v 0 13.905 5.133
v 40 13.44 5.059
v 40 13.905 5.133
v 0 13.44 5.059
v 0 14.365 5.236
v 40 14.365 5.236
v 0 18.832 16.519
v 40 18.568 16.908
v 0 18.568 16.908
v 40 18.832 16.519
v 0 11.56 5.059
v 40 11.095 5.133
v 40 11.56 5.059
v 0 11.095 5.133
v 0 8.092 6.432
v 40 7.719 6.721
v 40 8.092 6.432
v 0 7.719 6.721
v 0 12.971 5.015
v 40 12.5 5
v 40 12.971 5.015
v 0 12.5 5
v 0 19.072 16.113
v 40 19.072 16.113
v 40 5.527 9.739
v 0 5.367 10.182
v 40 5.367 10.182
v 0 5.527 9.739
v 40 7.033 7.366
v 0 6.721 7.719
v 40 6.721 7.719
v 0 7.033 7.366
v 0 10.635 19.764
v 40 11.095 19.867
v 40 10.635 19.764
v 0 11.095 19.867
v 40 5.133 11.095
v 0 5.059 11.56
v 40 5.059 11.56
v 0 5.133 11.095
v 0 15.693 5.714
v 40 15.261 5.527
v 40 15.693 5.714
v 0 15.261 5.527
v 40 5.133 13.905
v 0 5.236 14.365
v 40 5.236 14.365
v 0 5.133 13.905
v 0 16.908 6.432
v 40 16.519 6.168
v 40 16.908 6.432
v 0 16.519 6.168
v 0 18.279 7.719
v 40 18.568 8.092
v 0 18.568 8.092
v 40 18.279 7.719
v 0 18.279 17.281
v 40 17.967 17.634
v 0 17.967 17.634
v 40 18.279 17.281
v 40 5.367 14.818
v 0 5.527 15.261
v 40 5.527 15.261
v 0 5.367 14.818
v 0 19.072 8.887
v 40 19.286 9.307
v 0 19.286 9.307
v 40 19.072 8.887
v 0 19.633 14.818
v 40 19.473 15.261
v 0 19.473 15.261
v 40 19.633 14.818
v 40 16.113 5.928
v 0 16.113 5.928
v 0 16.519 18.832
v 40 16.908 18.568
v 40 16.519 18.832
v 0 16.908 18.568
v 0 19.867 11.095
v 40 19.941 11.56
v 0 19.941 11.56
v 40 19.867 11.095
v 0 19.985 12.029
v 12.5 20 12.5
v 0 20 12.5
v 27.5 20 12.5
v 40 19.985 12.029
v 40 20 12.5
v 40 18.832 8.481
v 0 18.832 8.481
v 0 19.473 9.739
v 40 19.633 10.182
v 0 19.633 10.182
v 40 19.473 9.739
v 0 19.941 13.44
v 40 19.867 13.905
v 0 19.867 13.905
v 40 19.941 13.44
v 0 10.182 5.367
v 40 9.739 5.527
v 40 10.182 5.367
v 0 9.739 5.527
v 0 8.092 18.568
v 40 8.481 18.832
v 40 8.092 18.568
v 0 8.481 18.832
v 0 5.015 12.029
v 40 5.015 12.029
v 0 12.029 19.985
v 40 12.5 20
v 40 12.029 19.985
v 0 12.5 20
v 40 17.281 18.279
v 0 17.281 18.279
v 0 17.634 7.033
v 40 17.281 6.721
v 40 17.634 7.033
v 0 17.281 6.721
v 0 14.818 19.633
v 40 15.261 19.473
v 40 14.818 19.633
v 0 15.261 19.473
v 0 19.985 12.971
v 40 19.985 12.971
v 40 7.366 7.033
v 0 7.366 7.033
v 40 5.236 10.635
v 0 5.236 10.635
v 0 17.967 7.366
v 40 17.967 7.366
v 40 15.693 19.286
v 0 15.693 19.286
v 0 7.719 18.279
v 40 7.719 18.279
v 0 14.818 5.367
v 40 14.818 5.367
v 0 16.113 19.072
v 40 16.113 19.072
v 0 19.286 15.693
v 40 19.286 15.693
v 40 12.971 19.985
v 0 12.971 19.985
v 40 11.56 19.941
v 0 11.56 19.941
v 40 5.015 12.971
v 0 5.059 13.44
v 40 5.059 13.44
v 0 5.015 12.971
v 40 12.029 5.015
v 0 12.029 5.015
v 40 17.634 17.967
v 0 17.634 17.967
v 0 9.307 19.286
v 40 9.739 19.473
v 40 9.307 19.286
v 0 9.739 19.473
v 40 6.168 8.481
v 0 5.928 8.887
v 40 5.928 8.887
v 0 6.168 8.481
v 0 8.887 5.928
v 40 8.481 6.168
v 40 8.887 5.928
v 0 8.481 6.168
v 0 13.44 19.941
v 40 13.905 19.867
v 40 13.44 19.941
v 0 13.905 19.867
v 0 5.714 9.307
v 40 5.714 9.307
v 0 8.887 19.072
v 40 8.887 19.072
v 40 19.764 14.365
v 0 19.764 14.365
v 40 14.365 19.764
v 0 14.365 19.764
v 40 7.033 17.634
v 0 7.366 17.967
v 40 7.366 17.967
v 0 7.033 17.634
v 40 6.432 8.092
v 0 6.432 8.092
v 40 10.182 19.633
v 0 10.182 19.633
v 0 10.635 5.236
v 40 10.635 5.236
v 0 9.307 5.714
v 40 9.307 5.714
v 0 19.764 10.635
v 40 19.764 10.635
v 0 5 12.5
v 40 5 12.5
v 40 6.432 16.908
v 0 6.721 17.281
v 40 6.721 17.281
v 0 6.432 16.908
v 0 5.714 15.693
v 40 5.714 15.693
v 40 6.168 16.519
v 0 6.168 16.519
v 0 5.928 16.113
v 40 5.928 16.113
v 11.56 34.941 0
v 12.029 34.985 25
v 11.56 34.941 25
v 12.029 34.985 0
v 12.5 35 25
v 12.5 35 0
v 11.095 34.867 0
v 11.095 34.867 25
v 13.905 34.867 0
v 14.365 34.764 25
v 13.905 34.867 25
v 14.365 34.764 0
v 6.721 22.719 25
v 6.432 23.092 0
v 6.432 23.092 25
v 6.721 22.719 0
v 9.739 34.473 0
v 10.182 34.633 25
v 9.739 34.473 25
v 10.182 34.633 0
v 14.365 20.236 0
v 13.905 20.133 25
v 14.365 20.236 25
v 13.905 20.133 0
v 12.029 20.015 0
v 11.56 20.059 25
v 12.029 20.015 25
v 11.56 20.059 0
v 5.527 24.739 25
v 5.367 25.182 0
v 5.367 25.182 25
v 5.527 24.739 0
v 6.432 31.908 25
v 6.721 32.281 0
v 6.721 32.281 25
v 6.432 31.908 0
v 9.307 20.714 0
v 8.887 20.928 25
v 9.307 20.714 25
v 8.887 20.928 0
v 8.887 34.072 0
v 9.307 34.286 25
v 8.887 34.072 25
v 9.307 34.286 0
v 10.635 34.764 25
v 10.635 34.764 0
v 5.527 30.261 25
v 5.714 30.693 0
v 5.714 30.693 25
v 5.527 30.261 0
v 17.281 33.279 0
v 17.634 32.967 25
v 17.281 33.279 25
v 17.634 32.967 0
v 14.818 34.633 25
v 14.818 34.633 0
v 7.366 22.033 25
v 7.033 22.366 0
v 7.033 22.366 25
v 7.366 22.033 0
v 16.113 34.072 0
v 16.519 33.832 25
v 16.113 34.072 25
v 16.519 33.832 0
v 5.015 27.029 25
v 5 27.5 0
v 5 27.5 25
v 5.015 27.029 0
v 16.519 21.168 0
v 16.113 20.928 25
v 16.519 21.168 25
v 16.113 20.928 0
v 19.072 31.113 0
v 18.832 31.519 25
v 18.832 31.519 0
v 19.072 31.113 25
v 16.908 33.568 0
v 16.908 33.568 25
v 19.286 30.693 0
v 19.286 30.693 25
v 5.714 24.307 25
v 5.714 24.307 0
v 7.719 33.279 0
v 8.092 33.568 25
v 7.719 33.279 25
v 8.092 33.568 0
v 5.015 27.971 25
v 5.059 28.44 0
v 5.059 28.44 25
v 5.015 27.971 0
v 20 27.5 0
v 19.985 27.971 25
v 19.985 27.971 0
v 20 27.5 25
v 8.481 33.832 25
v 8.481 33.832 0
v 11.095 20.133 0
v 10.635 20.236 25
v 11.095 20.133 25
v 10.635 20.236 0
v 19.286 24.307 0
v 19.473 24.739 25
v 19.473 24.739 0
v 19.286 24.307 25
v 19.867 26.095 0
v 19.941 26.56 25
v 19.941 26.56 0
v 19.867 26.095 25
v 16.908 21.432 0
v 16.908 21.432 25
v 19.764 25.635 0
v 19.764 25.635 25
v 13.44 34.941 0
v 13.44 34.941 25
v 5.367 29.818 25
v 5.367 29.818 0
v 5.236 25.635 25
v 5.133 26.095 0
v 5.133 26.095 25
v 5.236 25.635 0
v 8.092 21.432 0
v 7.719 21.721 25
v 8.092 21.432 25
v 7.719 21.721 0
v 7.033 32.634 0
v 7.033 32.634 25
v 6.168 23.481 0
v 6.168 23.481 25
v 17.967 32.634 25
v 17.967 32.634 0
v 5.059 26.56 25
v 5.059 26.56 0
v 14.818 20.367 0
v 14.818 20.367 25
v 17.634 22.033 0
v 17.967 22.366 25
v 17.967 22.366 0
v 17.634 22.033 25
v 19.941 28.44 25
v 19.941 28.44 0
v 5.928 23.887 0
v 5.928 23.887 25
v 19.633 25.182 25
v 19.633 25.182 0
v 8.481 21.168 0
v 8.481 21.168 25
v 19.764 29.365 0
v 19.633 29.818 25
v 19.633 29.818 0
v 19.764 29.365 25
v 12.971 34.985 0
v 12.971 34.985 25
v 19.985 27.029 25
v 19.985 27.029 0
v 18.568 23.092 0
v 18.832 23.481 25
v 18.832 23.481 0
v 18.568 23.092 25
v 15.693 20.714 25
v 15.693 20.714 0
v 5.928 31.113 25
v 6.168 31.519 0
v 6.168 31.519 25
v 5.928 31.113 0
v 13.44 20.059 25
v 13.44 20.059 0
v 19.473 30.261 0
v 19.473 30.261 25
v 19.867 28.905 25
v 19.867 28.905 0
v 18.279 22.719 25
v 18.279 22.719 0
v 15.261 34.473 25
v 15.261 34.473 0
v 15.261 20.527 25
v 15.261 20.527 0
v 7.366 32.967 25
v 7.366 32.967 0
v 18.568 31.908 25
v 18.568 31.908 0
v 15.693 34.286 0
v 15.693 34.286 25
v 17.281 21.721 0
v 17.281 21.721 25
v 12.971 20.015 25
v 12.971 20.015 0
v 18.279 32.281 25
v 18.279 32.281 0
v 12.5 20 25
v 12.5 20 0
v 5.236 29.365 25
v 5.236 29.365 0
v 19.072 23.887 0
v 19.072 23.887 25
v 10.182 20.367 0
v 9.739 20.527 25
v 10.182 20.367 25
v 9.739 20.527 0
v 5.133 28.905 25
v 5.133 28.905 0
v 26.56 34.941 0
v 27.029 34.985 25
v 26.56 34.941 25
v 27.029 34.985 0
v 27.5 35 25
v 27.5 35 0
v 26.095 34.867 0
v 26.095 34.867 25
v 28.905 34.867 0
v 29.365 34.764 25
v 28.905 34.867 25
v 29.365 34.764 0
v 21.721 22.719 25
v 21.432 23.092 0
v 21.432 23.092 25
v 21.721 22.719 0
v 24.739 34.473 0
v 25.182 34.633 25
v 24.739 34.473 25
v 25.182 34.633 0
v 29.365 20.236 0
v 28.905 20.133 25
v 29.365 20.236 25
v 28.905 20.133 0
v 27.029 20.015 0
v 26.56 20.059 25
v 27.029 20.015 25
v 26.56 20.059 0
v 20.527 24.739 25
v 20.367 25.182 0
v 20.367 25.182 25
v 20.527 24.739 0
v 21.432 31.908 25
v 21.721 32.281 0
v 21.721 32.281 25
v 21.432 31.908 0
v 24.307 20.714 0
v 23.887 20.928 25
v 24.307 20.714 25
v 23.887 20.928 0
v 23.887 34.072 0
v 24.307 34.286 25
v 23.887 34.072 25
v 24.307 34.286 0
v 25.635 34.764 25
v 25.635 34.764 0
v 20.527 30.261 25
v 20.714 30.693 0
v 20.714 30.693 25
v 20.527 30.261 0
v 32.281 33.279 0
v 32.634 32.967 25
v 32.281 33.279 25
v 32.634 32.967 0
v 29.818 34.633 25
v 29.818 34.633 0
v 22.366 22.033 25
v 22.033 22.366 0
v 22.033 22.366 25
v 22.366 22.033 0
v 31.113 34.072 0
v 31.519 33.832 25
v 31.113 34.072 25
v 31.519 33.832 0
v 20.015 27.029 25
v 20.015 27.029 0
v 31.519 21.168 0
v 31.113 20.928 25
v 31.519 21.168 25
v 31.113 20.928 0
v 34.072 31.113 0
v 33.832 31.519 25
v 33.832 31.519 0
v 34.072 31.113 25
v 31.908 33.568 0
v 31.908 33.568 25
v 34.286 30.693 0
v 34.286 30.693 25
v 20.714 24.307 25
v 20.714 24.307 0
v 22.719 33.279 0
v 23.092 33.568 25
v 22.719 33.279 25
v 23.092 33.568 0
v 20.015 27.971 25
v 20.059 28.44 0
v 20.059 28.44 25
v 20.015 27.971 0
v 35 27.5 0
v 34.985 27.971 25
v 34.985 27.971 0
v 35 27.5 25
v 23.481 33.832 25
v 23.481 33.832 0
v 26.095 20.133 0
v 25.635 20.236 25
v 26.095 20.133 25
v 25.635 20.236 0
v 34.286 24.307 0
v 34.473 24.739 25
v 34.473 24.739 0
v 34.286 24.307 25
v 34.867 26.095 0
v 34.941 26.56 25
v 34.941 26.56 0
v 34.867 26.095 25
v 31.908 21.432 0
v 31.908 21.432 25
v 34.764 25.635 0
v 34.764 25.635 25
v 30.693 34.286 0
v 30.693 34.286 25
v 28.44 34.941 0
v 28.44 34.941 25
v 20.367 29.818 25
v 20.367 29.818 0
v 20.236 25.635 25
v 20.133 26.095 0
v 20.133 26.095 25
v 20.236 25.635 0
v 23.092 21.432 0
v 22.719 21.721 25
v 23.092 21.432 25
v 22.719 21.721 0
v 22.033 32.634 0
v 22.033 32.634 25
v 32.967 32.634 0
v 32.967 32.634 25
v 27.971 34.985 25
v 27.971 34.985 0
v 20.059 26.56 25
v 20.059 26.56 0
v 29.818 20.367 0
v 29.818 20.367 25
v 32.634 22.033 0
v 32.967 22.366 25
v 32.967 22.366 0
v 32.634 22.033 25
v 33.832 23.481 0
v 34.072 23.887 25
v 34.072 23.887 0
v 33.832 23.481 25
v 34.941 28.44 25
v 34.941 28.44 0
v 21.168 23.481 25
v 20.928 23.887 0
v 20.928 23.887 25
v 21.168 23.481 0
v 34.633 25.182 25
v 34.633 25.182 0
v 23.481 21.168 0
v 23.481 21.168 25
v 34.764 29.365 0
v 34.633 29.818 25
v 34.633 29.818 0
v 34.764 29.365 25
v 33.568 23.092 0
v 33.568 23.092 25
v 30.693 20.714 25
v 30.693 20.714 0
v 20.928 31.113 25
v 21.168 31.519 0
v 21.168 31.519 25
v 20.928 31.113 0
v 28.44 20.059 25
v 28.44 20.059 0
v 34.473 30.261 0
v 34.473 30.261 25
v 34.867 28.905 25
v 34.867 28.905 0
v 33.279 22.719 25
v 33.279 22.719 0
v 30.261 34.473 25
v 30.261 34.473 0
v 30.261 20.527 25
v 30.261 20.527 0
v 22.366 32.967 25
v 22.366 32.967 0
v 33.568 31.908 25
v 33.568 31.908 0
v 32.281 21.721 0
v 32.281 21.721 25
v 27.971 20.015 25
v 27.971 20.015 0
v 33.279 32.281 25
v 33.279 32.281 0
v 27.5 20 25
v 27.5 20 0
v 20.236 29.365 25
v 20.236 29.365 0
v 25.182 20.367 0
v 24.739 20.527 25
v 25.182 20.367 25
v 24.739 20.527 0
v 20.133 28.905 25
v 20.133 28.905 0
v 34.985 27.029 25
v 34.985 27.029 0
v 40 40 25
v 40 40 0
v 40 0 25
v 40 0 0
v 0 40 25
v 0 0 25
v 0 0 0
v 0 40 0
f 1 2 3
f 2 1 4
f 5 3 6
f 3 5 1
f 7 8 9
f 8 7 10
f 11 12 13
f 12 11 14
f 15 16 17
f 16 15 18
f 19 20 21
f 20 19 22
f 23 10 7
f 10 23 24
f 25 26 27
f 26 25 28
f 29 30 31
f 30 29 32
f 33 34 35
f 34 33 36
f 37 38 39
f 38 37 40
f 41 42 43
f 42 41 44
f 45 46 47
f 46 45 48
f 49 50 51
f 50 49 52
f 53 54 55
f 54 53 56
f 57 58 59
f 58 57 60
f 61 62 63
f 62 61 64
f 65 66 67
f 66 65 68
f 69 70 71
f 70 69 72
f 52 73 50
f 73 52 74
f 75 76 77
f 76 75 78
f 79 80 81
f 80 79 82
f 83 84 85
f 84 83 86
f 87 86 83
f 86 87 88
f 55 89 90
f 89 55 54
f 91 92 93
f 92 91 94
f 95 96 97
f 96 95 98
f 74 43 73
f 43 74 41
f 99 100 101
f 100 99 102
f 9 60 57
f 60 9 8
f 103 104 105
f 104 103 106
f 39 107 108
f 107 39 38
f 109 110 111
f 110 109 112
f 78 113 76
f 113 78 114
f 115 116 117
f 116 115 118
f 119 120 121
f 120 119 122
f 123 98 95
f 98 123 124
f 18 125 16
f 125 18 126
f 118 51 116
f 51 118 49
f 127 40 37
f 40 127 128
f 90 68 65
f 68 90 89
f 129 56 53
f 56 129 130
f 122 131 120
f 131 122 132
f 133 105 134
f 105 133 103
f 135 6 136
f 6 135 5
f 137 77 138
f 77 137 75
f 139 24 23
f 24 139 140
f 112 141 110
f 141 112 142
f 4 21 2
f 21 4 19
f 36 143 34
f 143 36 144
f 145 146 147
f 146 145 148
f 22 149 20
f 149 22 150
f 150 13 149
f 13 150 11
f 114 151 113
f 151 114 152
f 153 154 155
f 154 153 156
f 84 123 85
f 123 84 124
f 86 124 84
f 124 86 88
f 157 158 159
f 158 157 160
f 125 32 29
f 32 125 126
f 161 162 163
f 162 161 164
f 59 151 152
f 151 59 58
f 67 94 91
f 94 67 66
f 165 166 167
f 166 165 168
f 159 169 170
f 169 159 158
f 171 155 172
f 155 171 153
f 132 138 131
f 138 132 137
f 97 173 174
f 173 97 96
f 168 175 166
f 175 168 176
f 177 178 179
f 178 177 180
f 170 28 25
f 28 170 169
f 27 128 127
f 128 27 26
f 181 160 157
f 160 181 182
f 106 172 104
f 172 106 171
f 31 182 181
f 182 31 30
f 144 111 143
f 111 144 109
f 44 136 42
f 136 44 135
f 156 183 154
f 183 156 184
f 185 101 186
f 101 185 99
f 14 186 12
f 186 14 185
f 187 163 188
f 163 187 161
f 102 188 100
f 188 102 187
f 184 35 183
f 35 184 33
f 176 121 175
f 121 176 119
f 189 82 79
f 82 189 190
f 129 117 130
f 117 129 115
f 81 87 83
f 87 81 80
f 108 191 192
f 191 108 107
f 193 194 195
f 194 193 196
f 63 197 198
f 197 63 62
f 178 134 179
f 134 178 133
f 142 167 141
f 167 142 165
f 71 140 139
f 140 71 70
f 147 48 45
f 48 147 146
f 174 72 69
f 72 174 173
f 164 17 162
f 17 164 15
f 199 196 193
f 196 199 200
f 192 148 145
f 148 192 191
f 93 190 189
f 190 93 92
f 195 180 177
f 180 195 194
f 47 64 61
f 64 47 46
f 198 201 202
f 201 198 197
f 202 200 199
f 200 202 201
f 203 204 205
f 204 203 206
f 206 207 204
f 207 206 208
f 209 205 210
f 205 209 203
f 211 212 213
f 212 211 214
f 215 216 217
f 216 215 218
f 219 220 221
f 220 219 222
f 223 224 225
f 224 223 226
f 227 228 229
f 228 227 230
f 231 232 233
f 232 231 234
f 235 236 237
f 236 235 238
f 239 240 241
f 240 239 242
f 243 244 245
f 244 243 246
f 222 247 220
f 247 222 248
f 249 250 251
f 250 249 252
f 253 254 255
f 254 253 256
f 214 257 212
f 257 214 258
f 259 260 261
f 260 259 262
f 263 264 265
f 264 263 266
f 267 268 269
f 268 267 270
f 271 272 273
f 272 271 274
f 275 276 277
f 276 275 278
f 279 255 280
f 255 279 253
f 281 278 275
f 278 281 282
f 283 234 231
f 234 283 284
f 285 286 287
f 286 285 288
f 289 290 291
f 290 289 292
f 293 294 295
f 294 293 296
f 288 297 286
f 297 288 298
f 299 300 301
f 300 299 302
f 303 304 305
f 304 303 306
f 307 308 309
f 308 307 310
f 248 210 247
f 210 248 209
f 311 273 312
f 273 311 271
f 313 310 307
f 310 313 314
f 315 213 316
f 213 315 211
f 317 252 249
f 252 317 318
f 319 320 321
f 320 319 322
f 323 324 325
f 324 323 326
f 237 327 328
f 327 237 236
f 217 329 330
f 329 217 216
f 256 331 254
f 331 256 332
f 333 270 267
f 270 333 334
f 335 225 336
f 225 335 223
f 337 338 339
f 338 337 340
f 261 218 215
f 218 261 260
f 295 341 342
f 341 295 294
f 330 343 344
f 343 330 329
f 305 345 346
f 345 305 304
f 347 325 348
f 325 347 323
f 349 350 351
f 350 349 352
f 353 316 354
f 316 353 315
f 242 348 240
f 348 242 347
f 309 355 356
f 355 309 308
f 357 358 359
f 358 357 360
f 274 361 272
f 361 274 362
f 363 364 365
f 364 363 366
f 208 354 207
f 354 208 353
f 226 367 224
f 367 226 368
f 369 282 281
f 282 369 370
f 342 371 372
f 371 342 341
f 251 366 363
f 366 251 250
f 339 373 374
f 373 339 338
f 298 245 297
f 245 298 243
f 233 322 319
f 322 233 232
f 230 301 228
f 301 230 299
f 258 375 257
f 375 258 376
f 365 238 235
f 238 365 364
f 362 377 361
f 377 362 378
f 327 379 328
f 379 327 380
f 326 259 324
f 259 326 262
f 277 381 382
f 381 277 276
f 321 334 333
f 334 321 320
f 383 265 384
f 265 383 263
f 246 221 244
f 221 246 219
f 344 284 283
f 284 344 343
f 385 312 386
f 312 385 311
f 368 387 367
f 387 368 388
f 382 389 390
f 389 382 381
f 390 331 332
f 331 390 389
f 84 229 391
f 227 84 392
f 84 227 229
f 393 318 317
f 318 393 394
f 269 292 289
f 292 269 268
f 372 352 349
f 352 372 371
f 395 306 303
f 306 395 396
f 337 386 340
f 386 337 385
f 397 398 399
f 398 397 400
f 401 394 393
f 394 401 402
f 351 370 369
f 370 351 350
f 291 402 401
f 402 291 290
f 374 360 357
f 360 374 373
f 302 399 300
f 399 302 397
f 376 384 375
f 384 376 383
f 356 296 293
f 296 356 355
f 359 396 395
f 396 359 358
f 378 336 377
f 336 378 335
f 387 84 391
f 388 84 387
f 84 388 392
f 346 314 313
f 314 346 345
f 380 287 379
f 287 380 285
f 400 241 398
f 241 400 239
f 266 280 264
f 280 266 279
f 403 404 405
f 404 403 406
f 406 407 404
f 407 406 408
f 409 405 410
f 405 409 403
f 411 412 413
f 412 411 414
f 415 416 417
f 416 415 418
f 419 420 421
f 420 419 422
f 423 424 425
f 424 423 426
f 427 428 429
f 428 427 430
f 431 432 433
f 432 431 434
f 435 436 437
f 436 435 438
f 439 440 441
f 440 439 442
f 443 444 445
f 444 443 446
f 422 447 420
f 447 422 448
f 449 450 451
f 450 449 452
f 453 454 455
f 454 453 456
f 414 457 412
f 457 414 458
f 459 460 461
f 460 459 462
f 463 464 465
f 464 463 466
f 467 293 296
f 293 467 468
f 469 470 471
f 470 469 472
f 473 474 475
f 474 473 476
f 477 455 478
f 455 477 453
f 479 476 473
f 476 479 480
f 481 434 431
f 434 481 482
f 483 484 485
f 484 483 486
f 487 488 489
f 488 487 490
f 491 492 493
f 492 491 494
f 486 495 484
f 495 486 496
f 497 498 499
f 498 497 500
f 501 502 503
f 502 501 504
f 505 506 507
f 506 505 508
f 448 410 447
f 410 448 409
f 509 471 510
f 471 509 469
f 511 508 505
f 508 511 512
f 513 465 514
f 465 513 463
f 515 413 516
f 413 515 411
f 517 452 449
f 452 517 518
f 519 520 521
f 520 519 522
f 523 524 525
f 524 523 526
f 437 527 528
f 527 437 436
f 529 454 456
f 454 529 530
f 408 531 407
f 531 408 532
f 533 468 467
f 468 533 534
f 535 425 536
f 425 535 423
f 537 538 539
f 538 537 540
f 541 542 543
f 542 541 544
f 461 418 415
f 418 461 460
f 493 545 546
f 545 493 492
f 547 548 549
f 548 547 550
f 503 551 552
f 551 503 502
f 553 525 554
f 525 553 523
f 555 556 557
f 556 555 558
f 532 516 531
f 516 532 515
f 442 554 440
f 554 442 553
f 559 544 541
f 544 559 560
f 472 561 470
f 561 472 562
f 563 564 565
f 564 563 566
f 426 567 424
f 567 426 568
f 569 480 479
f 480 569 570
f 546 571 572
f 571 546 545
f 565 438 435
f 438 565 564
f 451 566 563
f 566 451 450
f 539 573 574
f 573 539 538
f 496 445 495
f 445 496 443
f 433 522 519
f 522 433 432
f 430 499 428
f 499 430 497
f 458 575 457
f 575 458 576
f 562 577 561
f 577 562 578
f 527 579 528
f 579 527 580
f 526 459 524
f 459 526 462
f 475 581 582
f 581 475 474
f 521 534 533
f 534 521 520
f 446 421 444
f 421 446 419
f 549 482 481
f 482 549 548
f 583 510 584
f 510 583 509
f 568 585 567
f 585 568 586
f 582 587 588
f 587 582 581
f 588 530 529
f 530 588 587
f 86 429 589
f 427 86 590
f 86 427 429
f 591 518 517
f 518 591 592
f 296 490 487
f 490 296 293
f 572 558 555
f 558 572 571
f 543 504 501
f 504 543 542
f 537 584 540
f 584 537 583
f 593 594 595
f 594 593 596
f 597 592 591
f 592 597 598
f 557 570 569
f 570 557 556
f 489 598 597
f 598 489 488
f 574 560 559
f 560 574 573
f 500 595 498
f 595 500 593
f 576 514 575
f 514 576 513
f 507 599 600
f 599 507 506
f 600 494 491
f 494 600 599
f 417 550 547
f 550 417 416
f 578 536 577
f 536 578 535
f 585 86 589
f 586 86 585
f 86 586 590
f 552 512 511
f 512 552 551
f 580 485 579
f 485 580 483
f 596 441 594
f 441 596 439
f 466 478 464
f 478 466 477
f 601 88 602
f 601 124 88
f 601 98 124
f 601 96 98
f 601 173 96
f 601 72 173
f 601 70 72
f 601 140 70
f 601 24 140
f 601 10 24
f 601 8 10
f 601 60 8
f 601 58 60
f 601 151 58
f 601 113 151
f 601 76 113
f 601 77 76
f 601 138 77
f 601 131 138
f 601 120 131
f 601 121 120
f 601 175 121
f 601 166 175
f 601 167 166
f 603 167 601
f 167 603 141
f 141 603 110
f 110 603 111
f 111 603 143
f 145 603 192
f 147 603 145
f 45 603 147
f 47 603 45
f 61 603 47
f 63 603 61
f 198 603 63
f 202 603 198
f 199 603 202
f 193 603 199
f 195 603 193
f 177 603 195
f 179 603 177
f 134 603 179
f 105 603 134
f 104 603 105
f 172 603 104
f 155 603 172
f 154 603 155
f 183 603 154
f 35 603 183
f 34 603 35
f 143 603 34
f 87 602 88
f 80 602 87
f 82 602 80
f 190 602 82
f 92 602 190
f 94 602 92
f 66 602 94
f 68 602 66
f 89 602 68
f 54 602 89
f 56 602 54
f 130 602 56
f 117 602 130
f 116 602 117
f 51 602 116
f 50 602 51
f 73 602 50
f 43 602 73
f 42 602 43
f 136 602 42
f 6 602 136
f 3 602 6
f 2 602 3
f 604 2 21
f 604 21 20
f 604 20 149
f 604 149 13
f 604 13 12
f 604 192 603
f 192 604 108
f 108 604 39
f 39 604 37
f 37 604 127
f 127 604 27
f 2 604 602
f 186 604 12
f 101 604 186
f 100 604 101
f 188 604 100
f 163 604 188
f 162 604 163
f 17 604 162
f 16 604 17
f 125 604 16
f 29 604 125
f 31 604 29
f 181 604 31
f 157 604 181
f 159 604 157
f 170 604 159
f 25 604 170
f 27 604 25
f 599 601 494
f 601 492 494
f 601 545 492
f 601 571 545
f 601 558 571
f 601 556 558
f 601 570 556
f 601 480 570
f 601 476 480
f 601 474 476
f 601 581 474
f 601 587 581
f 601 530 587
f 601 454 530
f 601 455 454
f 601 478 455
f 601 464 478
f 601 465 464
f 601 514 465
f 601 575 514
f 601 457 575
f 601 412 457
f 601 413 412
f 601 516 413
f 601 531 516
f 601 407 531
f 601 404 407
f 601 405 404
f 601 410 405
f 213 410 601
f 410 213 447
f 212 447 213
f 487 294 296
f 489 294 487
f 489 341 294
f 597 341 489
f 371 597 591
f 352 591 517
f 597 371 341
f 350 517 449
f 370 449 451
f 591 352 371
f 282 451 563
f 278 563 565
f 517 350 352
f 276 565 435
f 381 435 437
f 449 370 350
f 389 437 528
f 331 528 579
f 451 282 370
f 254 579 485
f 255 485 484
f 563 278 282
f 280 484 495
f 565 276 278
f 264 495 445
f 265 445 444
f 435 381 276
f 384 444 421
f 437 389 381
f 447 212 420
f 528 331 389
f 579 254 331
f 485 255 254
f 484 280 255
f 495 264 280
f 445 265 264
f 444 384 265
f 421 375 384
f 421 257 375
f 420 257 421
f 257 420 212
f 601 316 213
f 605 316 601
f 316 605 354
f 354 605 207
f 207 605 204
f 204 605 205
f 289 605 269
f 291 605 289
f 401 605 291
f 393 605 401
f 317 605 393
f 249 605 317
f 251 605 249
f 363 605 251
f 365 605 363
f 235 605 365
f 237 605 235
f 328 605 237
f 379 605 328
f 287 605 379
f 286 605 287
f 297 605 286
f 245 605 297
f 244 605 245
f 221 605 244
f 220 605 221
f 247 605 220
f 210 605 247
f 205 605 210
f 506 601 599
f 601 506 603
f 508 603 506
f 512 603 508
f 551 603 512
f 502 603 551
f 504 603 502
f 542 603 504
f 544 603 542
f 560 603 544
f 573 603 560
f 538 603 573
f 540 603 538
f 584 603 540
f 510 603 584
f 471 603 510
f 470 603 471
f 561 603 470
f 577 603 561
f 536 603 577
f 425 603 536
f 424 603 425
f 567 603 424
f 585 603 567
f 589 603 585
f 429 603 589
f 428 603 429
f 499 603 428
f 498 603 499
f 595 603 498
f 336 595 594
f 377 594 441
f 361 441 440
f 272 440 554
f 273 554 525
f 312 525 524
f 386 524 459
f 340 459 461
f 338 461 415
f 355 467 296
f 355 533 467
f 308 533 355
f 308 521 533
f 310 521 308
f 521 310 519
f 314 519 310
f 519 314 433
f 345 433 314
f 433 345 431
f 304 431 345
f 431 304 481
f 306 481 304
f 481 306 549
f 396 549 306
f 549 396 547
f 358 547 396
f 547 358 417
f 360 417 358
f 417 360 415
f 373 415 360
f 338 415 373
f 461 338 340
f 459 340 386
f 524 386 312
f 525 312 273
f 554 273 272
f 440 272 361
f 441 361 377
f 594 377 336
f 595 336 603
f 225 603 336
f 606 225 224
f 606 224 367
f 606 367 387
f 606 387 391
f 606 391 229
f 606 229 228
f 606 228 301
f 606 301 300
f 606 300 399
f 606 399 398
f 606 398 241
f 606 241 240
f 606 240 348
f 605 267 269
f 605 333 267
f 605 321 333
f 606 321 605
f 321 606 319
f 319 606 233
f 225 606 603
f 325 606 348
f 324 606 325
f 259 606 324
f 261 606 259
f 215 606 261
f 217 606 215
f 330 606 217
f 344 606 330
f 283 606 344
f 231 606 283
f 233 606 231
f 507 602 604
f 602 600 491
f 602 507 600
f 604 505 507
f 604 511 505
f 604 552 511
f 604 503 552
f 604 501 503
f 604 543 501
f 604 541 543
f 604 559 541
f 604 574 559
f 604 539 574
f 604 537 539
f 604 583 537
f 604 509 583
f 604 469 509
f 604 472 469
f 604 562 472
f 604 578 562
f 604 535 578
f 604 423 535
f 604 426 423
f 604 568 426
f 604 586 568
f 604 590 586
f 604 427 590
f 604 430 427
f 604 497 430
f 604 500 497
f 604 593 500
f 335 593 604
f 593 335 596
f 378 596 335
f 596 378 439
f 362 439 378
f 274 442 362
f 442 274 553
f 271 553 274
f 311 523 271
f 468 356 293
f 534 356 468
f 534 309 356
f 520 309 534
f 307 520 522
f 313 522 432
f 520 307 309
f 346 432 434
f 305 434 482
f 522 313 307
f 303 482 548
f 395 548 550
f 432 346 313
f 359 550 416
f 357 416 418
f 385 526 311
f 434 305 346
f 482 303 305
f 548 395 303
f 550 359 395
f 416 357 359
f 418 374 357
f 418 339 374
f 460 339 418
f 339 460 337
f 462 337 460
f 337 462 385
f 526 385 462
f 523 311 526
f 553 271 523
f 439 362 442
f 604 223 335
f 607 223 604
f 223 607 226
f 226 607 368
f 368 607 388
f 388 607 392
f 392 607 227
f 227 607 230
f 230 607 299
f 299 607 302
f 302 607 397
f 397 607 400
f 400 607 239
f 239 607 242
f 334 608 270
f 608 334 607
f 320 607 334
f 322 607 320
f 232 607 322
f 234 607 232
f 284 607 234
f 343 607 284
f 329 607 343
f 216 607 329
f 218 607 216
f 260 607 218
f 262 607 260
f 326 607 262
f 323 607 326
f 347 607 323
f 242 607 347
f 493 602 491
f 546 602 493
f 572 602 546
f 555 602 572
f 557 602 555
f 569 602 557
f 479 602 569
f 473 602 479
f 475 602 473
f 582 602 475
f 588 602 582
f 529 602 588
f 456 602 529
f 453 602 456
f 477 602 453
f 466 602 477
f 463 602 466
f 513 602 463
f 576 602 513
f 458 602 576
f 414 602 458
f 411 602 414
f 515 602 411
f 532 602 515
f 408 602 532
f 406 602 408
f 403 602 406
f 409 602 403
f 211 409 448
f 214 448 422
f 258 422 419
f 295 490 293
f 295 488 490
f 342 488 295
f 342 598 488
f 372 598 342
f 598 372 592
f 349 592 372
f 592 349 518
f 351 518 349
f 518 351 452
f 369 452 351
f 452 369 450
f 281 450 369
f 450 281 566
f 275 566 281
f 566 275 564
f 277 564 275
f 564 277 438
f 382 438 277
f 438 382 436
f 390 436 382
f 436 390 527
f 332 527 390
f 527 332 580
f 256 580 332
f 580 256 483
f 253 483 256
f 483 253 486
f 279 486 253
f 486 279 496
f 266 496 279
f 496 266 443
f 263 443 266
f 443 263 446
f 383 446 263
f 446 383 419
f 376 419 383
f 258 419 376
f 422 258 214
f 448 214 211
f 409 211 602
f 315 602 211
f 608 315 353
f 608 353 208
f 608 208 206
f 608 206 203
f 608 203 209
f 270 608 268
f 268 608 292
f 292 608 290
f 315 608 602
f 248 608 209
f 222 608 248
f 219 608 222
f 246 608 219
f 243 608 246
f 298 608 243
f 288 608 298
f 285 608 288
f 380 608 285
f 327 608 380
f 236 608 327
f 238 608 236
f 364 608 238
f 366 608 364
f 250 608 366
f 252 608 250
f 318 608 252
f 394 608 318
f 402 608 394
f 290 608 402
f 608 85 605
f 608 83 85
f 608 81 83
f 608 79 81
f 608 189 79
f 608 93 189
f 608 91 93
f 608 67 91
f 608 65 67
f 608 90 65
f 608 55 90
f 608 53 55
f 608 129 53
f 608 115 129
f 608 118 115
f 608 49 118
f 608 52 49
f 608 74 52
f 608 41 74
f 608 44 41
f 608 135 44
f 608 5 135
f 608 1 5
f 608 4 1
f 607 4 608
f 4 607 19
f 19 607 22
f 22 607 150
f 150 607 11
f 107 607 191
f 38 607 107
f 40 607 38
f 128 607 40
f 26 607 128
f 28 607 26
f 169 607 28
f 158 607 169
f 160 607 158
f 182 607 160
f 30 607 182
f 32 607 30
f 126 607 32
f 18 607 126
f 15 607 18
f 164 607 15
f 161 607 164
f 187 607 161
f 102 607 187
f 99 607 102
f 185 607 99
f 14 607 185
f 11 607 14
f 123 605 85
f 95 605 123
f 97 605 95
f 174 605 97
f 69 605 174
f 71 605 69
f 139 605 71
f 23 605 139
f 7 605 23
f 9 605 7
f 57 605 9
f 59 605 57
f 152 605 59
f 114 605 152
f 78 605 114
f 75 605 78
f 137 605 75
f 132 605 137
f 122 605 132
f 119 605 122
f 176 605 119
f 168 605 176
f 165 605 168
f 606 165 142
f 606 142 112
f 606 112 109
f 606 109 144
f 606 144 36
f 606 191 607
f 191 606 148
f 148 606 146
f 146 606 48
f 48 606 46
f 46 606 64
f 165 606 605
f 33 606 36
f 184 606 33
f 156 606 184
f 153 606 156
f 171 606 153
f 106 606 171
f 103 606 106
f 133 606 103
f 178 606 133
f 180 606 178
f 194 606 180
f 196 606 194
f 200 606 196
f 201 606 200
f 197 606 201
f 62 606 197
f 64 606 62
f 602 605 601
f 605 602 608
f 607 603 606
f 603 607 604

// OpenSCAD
difference(){
	union(){ 

        translate([0,0,0]){
           cube([40,40,25], center=false);
        }                
            
	}
	union() {

        translate([0,12.5,12.5]){
            rotate([0,90,0]){
                cylinder(h=200, r=7.5, $fn=100, center=true);
            }   
        }
        translate([12.5,12.5+15,12.5]){
            rotate([0,0,90]){
                cylinder(h=200, r=7.5, $fn=100, center=true);
            }   
        }
        translate([12.5+15,12.5+15,12.5]){
            rotate([0,0,90]){
                cylinder(h=200, r=7.5, $fn=100, center=true);
            }   
        }
               

	}
}
